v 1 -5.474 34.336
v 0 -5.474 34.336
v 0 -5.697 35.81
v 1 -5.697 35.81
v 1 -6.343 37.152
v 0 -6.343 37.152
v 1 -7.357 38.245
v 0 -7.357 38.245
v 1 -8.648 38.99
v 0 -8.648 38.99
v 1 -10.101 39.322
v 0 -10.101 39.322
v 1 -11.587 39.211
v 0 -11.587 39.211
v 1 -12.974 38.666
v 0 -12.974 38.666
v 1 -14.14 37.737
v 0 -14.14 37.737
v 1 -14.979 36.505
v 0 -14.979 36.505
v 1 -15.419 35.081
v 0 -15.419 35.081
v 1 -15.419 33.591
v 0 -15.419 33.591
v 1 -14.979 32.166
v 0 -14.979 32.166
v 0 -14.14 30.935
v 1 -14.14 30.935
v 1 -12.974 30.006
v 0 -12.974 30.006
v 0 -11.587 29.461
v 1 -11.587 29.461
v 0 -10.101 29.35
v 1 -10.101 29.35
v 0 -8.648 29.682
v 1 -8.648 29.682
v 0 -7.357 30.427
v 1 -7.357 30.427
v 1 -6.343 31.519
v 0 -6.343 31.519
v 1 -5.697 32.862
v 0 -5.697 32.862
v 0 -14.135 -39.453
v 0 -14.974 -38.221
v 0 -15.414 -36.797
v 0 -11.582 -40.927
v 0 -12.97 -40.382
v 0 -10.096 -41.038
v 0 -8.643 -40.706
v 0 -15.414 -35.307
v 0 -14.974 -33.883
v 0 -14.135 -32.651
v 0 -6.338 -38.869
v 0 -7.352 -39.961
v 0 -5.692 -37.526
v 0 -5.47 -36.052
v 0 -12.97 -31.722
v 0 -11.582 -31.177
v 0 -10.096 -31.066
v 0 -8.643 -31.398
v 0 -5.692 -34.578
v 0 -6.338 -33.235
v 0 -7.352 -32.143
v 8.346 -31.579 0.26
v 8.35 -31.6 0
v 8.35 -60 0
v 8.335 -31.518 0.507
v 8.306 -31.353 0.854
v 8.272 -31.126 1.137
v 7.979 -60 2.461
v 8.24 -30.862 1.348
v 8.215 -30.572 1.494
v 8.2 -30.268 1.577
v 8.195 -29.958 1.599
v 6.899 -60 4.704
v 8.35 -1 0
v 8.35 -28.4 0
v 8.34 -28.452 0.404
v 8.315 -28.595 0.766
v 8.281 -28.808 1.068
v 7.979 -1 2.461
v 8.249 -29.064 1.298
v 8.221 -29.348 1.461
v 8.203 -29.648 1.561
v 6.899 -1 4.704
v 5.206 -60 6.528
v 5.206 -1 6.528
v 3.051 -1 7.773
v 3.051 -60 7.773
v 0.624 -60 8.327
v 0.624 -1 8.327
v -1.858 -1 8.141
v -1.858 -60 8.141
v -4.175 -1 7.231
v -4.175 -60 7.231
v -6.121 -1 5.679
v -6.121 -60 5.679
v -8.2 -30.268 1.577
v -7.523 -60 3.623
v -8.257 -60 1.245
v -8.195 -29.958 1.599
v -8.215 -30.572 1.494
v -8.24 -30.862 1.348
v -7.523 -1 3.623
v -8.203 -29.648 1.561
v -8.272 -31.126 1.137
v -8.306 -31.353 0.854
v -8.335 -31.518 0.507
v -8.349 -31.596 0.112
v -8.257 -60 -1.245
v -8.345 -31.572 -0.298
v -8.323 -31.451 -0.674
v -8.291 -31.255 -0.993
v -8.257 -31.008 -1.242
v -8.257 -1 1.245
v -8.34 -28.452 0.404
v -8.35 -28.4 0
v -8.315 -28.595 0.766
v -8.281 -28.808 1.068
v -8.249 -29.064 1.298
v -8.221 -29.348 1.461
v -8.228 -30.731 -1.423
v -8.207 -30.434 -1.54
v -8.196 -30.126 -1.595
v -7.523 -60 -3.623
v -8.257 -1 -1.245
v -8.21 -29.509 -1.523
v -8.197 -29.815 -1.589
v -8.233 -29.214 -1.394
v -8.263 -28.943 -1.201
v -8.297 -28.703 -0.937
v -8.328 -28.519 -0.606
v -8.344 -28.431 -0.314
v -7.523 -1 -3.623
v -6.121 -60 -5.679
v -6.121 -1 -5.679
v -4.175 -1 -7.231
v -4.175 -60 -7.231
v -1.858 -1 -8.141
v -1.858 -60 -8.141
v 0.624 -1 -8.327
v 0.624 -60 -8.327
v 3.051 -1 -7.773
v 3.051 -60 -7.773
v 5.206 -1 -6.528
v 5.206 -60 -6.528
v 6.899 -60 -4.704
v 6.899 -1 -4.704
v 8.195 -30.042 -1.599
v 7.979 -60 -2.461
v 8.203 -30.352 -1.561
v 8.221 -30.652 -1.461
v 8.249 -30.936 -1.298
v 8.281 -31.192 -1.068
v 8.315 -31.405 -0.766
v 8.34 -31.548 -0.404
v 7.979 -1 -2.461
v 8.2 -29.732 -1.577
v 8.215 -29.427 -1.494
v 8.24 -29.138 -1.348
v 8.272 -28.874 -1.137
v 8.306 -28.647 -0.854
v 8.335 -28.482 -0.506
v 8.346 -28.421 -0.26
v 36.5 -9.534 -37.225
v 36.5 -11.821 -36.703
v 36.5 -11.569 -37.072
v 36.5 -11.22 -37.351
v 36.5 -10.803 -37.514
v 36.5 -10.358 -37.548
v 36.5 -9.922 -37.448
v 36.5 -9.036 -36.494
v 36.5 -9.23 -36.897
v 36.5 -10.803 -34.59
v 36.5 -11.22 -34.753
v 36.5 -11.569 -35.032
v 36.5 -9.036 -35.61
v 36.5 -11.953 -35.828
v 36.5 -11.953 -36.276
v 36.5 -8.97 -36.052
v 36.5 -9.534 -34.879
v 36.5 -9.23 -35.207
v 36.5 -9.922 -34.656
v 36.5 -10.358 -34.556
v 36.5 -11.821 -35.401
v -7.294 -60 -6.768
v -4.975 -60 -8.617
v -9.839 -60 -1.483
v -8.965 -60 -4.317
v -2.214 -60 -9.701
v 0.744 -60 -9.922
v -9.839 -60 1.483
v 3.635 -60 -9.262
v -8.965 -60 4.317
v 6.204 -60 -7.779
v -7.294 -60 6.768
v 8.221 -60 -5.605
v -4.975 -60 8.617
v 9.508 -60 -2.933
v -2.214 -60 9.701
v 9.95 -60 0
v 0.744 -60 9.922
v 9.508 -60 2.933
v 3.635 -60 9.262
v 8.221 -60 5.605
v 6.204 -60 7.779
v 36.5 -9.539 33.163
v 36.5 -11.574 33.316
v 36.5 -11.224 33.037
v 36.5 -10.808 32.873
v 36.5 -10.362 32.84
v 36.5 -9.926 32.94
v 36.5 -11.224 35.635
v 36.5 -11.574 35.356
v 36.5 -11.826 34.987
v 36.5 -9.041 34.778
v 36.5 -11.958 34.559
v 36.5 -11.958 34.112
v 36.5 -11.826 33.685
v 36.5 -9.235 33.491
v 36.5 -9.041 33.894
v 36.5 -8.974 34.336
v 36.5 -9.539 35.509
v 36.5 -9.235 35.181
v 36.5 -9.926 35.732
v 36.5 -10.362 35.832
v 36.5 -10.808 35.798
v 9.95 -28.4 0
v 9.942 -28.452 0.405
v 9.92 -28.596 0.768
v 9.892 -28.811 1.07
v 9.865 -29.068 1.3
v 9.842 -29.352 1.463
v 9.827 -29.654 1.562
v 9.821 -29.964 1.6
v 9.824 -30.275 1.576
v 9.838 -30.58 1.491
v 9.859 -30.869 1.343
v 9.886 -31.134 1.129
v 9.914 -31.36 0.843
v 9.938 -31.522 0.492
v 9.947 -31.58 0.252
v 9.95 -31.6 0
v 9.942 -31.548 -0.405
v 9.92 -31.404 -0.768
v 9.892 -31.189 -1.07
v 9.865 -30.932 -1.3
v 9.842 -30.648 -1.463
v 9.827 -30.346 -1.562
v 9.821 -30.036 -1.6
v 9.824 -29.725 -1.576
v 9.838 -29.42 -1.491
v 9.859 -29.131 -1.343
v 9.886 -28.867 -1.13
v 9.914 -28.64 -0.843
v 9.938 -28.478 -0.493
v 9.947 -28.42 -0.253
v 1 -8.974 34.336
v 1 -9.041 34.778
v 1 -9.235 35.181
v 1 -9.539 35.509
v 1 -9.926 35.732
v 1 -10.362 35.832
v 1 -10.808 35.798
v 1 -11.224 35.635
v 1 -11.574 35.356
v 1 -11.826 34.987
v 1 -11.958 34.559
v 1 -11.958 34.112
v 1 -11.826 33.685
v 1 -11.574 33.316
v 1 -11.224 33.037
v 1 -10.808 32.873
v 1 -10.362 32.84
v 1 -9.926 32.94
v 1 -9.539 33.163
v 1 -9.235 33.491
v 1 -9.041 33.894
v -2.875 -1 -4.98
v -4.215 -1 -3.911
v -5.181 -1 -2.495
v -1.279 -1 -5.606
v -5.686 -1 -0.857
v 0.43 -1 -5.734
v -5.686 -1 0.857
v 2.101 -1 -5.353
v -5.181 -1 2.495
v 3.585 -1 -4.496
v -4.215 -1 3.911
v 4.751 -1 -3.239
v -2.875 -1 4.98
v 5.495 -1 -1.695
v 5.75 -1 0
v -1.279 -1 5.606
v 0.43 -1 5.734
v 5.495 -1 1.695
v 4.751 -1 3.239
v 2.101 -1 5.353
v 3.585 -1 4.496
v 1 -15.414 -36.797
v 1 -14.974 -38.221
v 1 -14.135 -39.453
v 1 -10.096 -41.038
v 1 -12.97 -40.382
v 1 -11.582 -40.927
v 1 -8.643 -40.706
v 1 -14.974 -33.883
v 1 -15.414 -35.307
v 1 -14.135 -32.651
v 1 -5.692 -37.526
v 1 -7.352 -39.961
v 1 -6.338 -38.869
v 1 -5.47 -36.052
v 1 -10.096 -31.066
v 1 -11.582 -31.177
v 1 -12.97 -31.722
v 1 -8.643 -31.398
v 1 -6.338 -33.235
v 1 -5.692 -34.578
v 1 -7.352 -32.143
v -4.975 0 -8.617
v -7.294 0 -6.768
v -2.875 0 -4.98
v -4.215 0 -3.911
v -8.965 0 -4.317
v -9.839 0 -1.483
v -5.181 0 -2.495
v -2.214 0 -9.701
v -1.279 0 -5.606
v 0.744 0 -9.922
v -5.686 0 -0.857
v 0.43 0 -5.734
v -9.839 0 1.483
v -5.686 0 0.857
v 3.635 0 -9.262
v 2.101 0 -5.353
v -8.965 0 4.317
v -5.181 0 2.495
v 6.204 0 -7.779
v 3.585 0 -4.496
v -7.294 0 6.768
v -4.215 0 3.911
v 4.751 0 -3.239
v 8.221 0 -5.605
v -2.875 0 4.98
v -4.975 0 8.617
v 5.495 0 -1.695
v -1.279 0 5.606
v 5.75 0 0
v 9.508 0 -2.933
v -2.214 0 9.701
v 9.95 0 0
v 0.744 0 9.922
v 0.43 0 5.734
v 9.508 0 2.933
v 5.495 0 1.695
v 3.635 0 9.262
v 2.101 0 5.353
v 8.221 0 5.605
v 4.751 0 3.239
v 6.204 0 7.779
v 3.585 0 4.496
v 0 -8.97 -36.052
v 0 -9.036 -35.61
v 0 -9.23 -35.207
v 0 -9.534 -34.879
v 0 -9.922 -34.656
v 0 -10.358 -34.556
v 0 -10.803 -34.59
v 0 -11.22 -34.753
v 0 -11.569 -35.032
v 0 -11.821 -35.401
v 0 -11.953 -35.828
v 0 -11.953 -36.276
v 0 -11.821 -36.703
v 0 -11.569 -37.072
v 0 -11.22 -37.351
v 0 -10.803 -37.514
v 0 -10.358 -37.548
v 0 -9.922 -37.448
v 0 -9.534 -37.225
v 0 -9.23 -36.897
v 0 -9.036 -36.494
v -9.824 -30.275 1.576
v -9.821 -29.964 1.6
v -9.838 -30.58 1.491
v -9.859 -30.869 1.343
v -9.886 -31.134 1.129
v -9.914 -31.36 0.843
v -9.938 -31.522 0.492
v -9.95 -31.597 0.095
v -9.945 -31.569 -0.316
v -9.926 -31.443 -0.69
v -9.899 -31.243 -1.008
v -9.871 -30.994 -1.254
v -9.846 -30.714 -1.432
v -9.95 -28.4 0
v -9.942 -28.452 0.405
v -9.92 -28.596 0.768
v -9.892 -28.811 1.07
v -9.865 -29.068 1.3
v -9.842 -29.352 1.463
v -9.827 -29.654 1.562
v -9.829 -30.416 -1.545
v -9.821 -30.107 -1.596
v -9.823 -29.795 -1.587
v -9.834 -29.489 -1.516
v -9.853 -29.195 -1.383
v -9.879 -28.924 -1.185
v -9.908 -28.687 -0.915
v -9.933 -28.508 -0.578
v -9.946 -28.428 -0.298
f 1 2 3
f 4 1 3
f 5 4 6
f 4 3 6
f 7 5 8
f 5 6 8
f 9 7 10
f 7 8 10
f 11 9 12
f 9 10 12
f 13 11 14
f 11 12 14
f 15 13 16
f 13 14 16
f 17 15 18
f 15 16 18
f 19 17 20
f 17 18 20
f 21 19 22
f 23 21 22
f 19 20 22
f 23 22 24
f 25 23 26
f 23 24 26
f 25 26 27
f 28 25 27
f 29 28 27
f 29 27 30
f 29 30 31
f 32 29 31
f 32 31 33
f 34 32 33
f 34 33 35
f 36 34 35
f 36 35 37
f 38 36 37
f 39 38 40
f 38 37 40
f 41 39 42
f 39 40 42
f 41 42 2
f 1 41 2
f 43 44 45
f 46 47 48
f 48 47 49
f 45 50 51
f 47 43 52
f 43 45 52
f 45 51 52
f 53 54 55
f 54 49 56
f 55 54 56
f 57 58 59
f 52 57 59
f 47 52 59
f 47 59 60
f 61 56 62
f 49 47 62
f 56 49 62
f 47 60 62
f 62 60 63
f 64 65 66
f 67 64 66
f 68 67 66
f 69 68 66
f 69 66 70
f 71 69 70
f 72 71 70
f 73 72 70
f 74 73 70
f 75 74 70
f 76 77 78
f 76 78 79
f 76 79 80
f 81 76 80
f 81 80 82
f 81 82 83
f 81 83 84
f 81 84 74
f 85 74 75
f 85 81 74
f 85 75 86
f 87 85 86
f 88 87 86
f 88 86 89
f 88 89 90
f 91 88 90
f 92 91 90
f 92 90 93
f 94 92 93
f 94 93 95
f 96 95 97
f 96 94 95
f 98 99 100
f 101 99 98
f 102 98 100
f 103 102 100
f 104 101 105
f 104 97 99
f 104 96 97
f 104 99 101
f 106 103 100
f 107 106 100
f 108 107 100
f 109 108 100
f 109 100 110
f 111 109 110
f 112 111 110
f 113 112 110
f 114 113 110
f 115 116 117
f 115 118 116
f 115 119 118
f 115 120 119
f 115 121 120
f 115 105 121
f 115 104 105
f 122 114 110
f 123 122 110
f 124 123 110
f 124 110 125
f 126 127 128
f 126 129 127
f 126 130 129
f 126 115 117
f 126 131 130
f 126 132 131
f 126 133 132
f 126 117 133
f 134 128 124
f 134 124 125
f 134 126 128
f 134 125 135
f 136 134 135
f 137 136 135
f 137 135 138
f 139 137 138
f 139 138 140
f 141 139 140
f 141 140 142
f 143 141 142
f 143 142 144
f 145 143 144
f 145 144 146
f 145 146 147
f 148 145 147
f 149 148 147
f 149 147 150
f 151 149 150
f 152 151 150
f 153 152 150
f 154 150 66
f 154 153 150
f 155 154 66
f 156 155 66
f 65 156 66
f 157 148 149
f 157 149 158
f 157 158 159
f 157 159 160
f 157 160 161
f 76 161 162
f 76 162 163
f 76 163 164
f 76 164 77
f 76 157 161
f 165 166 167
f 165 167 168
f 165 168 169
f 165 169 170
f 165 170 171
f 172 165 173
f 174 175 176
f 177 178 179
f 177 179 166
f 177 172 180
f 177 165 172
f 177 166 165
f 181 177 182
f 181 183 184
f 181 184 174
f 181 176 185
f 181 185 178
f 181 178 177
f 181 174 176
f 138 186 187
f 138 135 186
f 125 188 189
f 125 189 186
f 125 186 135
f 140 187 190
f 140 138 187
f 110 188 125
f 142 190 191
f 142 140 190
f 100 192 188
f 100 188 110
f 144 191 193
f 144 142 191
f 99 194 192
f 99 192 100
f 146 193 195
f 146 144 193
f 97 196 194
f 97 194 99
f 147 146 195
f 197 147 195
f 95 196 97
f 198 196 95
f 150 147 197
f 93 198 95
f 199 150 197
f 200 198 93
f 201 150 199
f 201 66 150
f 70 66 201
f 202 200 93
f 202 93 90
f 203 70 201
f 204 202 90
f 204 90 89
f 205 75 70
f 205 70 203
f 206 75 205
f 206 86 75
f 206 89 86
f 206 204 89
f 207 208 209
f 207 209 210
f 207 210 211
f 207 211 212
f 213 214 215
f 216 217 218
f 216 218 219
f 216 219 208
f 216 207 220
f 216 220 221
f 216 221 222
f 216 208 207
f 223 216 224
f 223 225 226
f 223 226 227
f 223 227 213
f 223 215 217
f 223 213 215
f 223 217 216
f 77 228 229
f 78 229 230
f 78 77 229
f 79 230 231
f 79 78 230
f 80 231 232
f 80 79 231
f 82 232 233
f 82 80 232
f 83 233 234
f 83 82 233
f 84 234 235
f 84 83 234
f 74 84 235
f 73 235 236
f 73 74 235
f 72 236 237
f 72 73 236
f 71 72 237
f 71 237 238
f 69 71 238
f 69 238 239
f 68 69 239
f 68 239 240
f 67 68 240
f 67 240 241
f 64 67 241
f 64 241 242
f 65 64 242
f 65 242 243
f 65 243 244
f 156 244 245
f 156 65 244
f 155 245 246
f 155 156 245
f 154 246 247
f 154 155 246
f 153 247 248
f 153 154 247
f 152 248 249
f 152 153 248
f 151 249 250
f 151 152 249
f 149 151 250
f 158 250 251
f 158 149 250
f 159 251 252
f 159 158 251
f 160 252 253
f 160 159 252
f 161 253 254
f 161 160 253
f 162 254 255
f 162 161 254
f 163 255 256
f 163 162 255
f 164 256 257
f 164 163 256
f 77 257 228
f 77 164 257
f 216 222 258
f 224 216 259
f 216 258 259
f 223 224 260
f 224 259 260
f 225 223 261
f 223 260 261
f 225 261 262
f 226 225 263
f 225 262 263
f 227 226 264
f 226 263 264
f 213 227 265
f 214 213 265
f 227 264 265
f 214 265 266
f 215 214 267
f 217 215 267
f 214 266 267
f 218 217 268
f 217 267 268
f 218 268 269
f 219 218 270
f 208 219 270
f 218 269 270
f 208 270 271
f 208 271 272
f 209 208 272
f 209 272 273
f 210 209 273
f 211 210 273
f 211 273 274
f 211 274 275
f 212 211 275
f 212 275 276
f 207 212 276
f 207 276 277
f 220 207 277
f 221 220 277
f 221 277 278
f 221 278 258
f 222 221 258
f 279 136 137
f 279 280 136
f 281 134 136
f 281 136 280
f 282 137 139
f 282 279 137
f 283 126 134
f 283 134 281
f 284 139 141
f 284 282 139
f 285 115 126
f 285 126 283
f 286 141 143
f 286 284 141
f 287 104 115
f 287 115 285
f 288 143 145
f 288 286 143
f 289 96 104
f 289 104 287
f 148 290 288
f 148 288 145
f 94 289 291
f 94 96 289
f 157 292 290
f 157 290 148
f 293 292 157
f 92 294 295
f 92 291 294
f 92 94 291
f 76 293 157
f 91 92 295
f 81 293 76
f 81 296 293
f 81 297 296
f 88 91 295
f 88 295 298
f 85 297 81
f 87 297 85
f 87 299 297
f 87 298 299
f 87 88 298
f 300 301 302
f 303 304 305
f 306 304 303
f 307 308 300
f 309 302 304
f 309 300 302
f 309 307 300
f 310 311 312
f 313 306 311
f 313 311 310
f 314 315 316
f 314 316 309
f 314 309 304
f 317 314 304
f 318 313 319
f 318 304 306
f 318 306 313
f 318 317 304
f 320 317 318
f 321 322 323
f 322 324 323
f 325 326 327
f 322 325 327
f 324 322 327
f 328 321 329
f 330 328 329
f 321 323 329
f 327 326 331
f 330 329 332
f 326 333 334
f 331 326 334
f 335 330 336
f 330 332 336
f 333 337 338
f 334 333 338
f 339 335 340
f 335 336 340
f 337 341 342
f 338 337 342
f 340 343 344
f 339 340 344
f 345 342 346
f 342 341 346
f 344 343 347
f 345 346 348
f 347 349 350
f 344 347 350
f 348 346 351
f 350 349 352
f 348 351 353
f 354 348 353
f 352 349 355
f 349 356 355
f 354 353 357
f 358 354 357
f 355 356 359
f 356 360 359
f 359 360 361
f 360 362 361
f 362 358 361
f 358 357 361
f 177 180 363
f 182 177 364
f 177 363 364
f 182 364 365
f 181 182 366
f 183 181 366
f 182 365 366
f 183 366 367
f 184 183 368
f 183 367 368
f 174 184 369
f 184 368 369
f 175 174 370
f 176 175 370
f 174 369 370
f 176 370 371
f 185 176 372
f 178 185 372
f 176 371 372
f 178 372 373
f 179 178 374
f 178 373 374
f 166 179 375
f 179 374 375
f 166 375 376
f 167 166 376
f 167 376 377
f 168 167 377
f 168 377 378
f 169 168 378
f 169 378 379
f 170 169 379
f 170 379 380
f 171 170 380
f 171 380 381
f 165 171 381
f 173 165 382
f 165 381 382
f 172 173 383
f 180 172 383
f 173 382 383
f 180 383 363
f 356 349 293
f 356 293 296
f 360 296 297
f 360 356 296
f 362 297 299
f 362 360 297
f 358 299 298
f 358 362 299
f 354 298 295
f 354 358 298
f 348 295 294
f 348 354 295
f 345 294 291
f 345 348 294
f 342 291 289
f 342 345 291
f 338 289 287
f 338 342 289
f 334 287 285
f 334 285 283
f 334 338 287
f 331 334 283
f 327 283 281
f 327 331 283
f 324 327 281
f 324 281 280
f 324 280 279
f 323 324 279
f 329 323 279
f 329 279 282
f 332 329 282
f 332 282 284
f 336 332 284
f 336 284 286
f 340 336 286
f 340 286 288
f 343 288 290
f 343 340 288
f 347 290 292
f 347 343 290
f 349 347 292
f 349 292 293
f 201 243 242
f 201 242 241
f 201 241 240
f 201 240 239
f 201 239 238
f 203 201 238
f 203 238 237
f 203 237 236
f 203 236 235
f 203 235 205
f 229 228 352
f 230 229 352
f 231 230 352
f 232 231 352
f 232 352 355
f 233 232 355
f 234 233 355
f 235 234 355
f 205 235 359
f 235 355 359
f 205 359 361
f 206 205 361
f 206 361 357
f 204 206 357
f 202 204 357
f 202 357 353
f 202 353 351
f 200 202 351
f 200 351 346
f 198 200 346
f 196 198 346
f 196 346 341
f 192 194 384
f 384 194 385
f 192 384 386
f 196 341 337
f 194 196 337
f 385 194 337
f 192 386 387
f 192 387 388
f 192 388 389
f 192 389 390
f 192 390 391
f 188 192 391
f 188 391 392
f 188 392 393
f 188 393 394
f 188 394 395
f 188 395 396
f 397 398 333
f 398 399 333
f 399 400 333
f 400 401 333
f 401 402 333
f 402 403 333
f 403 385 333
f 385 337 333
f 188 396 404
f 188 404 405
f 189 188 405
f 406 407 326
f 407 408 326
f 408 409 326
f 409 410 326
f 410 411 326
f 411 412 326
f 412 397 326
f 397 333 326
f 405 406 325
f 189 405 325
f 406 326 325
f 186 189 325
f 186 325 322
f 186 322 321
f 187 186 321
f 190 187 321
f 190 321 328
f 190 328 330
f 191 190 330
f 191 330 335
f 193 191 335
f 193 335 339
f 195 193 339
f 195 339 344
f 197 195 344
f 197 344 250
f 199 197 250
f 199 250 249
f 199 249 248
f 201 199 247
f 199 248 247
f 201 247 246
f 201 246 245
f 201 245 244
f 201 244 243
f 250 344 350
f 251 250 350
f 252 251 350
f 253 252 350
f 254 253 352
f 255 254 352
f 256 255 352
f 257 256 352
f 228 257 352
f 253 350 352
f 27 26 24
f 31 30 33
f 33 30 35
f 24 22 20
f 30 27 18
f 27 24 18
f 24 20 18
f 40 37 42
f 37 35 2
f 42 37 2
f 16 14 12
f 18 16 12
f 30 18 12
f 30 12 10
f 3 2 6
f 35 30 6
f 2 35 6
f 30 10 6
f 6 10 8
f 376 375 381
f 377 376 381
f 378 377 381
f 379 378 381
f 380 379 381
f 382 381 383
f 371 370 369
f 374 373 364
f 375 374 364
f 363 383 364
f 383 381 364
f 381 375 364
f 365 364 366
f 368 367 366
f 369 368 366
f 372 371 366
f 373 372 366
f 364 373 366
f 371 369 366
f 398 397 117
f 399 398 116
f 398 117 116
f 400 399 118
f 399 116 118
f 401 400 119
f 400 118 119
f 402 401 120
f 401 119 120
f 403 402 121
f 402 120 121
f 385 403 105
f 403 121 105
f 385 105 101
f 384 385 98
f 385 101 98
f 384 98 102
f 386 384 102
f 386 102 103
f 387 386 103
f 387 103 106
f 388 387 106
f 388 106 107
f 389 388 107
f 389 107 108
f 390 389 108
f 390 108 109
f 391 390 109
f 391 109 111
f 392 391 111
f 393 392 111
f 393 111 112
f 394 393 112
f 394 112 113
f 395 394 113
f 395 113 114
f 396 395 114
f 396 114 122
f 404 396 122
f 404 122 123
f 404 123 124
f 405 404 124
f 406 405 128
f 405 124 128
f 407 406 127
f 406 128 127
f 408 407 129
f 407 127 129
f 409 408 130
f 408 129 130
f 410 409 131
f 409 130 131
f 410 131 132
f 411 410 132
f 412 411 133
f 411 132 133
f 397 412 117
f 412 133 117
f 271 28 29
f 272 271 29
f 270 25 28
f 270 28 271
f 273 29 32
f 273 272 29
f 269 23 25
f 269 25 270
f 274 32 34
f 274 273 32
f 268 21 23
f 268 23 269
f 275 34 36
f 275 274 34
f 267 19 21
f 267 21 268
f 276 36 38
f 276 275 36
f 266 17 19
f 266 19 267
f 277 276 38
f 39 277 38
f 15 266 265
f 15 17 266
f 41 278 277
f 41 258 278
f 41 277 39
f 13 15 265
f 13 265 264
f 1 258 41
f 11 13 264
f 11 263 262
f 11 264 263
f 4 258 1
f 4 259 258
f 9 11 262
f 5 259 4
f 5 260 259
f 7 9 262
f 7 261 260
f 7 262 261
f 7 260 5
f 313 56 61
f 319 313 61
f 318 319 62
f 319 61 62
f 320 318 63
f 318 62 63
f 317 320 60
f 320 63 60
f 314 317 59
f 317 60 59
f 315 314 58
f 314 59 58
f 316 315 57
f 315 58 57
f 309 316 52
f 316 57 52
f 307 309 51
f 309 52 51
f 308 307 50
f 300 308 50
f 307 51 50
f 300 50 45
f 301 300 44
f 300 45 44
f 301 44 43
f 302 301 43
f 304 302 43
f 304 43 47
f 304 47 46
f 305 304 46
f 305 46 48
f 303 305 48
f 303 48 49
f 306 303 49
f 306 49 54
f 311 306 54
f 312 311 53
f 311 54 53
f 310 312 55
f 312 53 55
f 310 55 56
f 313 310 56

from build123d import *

# Parameters (mm, degrees)
F0_R      = 9.95
F0_R_2    = 8.35
F1_DEPTH  = 60
F0_R_3    = 5.75
F2_DEPTH  = 1
F3_R      = 1.6
F4_DEPTH  = 9.951
F5_R      = 1.6
F6_DEPTH  = 9.951
F7_R      = 5
F7_R_2    = 1.5
F8_DEPTH  = 1
F9_DEPTH  = 36.5
F10_R     = 1.5
F11_DEPTH = 36.5
F10_R_2   = 5
F12_DEPTH = 1


with BuildPart() as f1:
    # F0 (on Front) → F1 (new body)
    with BuildSketch(Plane.XZ):
        Circle(F0_R)
        Circle(F0_R_2, mode=Mode.SUBTRACT)
    extrude(amount=F1_DEPTH)

    # F0 (on Front) → F2 (join)
    with BuildSketch(Plane.XZ):
        Circle(F0_R_2)
        Circle(F0_R_3, mode=Mode.SUBTRACT)
    extrude(amount=F2_DEPTH)

    # F3 (on Right) → F4 (cut, through all)
    with BuildSketch(Plane.YZ):
        with Locations((-30, 0)):
            Circle(F3_R)
    extrude(amount=-F4_DEPTH, mode=Mode.SUBTRACT)

    # F5 (on Right) → F6 (cut, through all)
    with BuildSketch(Plane.YZ):
        with Locations((-30, 0)):
            Circle(F5_R)
    extrude(amount=F6_DEPTH, mode=Mode.SUBTRACT)


with BuildPart() as f8:
    # F7 (on Right) → F8 (new body)
    with BuildSketch(Plane.YZ):
        with Locations((-10.469654, -36.052026)):
            Circle(F7_R)
        with Locations((-10.469654, -36.052026)):
            Circle(F7_R_2, mode=Mode.SUBTRACT)
        with Locations((-10.469654, -36.052026)):
            Circle(F7_R_2)
    extrude(amount=F8_DEPTH)


with BuildPart() as f9:
    # F7 (on Right) → F9 (new body)
    with BuildSketch(Plane.YZ):
        with Locations((-10.469654, -36.052026)):
            Circle(F7_R_2)
    extrude(amount=F9_DEPTH)


with BuildPart() as f11:
    # F10 (on Right) → F11 (new body)
    with BuildSketch(Plane.YZ):
        with Locations((-10.474491, 34.335879)):
            Circle(F10_R)
    extrude(amount=F11_DEPTH)

    # F10 (on Right) → F12 (join)
    with BuildSketch(Plane.YZ):
        with Locations((-10.474491, 34.335879)):
            Circle(F10_R_2)
        with Locations((-10.474491, 34.335879)):
            Circle(F10_R, mode=Mode.SUBTRACT)
    extrude(amount=F12_DEPTH)


solid = Compound([f1.part, f8.part, f9.part, f11.part])
